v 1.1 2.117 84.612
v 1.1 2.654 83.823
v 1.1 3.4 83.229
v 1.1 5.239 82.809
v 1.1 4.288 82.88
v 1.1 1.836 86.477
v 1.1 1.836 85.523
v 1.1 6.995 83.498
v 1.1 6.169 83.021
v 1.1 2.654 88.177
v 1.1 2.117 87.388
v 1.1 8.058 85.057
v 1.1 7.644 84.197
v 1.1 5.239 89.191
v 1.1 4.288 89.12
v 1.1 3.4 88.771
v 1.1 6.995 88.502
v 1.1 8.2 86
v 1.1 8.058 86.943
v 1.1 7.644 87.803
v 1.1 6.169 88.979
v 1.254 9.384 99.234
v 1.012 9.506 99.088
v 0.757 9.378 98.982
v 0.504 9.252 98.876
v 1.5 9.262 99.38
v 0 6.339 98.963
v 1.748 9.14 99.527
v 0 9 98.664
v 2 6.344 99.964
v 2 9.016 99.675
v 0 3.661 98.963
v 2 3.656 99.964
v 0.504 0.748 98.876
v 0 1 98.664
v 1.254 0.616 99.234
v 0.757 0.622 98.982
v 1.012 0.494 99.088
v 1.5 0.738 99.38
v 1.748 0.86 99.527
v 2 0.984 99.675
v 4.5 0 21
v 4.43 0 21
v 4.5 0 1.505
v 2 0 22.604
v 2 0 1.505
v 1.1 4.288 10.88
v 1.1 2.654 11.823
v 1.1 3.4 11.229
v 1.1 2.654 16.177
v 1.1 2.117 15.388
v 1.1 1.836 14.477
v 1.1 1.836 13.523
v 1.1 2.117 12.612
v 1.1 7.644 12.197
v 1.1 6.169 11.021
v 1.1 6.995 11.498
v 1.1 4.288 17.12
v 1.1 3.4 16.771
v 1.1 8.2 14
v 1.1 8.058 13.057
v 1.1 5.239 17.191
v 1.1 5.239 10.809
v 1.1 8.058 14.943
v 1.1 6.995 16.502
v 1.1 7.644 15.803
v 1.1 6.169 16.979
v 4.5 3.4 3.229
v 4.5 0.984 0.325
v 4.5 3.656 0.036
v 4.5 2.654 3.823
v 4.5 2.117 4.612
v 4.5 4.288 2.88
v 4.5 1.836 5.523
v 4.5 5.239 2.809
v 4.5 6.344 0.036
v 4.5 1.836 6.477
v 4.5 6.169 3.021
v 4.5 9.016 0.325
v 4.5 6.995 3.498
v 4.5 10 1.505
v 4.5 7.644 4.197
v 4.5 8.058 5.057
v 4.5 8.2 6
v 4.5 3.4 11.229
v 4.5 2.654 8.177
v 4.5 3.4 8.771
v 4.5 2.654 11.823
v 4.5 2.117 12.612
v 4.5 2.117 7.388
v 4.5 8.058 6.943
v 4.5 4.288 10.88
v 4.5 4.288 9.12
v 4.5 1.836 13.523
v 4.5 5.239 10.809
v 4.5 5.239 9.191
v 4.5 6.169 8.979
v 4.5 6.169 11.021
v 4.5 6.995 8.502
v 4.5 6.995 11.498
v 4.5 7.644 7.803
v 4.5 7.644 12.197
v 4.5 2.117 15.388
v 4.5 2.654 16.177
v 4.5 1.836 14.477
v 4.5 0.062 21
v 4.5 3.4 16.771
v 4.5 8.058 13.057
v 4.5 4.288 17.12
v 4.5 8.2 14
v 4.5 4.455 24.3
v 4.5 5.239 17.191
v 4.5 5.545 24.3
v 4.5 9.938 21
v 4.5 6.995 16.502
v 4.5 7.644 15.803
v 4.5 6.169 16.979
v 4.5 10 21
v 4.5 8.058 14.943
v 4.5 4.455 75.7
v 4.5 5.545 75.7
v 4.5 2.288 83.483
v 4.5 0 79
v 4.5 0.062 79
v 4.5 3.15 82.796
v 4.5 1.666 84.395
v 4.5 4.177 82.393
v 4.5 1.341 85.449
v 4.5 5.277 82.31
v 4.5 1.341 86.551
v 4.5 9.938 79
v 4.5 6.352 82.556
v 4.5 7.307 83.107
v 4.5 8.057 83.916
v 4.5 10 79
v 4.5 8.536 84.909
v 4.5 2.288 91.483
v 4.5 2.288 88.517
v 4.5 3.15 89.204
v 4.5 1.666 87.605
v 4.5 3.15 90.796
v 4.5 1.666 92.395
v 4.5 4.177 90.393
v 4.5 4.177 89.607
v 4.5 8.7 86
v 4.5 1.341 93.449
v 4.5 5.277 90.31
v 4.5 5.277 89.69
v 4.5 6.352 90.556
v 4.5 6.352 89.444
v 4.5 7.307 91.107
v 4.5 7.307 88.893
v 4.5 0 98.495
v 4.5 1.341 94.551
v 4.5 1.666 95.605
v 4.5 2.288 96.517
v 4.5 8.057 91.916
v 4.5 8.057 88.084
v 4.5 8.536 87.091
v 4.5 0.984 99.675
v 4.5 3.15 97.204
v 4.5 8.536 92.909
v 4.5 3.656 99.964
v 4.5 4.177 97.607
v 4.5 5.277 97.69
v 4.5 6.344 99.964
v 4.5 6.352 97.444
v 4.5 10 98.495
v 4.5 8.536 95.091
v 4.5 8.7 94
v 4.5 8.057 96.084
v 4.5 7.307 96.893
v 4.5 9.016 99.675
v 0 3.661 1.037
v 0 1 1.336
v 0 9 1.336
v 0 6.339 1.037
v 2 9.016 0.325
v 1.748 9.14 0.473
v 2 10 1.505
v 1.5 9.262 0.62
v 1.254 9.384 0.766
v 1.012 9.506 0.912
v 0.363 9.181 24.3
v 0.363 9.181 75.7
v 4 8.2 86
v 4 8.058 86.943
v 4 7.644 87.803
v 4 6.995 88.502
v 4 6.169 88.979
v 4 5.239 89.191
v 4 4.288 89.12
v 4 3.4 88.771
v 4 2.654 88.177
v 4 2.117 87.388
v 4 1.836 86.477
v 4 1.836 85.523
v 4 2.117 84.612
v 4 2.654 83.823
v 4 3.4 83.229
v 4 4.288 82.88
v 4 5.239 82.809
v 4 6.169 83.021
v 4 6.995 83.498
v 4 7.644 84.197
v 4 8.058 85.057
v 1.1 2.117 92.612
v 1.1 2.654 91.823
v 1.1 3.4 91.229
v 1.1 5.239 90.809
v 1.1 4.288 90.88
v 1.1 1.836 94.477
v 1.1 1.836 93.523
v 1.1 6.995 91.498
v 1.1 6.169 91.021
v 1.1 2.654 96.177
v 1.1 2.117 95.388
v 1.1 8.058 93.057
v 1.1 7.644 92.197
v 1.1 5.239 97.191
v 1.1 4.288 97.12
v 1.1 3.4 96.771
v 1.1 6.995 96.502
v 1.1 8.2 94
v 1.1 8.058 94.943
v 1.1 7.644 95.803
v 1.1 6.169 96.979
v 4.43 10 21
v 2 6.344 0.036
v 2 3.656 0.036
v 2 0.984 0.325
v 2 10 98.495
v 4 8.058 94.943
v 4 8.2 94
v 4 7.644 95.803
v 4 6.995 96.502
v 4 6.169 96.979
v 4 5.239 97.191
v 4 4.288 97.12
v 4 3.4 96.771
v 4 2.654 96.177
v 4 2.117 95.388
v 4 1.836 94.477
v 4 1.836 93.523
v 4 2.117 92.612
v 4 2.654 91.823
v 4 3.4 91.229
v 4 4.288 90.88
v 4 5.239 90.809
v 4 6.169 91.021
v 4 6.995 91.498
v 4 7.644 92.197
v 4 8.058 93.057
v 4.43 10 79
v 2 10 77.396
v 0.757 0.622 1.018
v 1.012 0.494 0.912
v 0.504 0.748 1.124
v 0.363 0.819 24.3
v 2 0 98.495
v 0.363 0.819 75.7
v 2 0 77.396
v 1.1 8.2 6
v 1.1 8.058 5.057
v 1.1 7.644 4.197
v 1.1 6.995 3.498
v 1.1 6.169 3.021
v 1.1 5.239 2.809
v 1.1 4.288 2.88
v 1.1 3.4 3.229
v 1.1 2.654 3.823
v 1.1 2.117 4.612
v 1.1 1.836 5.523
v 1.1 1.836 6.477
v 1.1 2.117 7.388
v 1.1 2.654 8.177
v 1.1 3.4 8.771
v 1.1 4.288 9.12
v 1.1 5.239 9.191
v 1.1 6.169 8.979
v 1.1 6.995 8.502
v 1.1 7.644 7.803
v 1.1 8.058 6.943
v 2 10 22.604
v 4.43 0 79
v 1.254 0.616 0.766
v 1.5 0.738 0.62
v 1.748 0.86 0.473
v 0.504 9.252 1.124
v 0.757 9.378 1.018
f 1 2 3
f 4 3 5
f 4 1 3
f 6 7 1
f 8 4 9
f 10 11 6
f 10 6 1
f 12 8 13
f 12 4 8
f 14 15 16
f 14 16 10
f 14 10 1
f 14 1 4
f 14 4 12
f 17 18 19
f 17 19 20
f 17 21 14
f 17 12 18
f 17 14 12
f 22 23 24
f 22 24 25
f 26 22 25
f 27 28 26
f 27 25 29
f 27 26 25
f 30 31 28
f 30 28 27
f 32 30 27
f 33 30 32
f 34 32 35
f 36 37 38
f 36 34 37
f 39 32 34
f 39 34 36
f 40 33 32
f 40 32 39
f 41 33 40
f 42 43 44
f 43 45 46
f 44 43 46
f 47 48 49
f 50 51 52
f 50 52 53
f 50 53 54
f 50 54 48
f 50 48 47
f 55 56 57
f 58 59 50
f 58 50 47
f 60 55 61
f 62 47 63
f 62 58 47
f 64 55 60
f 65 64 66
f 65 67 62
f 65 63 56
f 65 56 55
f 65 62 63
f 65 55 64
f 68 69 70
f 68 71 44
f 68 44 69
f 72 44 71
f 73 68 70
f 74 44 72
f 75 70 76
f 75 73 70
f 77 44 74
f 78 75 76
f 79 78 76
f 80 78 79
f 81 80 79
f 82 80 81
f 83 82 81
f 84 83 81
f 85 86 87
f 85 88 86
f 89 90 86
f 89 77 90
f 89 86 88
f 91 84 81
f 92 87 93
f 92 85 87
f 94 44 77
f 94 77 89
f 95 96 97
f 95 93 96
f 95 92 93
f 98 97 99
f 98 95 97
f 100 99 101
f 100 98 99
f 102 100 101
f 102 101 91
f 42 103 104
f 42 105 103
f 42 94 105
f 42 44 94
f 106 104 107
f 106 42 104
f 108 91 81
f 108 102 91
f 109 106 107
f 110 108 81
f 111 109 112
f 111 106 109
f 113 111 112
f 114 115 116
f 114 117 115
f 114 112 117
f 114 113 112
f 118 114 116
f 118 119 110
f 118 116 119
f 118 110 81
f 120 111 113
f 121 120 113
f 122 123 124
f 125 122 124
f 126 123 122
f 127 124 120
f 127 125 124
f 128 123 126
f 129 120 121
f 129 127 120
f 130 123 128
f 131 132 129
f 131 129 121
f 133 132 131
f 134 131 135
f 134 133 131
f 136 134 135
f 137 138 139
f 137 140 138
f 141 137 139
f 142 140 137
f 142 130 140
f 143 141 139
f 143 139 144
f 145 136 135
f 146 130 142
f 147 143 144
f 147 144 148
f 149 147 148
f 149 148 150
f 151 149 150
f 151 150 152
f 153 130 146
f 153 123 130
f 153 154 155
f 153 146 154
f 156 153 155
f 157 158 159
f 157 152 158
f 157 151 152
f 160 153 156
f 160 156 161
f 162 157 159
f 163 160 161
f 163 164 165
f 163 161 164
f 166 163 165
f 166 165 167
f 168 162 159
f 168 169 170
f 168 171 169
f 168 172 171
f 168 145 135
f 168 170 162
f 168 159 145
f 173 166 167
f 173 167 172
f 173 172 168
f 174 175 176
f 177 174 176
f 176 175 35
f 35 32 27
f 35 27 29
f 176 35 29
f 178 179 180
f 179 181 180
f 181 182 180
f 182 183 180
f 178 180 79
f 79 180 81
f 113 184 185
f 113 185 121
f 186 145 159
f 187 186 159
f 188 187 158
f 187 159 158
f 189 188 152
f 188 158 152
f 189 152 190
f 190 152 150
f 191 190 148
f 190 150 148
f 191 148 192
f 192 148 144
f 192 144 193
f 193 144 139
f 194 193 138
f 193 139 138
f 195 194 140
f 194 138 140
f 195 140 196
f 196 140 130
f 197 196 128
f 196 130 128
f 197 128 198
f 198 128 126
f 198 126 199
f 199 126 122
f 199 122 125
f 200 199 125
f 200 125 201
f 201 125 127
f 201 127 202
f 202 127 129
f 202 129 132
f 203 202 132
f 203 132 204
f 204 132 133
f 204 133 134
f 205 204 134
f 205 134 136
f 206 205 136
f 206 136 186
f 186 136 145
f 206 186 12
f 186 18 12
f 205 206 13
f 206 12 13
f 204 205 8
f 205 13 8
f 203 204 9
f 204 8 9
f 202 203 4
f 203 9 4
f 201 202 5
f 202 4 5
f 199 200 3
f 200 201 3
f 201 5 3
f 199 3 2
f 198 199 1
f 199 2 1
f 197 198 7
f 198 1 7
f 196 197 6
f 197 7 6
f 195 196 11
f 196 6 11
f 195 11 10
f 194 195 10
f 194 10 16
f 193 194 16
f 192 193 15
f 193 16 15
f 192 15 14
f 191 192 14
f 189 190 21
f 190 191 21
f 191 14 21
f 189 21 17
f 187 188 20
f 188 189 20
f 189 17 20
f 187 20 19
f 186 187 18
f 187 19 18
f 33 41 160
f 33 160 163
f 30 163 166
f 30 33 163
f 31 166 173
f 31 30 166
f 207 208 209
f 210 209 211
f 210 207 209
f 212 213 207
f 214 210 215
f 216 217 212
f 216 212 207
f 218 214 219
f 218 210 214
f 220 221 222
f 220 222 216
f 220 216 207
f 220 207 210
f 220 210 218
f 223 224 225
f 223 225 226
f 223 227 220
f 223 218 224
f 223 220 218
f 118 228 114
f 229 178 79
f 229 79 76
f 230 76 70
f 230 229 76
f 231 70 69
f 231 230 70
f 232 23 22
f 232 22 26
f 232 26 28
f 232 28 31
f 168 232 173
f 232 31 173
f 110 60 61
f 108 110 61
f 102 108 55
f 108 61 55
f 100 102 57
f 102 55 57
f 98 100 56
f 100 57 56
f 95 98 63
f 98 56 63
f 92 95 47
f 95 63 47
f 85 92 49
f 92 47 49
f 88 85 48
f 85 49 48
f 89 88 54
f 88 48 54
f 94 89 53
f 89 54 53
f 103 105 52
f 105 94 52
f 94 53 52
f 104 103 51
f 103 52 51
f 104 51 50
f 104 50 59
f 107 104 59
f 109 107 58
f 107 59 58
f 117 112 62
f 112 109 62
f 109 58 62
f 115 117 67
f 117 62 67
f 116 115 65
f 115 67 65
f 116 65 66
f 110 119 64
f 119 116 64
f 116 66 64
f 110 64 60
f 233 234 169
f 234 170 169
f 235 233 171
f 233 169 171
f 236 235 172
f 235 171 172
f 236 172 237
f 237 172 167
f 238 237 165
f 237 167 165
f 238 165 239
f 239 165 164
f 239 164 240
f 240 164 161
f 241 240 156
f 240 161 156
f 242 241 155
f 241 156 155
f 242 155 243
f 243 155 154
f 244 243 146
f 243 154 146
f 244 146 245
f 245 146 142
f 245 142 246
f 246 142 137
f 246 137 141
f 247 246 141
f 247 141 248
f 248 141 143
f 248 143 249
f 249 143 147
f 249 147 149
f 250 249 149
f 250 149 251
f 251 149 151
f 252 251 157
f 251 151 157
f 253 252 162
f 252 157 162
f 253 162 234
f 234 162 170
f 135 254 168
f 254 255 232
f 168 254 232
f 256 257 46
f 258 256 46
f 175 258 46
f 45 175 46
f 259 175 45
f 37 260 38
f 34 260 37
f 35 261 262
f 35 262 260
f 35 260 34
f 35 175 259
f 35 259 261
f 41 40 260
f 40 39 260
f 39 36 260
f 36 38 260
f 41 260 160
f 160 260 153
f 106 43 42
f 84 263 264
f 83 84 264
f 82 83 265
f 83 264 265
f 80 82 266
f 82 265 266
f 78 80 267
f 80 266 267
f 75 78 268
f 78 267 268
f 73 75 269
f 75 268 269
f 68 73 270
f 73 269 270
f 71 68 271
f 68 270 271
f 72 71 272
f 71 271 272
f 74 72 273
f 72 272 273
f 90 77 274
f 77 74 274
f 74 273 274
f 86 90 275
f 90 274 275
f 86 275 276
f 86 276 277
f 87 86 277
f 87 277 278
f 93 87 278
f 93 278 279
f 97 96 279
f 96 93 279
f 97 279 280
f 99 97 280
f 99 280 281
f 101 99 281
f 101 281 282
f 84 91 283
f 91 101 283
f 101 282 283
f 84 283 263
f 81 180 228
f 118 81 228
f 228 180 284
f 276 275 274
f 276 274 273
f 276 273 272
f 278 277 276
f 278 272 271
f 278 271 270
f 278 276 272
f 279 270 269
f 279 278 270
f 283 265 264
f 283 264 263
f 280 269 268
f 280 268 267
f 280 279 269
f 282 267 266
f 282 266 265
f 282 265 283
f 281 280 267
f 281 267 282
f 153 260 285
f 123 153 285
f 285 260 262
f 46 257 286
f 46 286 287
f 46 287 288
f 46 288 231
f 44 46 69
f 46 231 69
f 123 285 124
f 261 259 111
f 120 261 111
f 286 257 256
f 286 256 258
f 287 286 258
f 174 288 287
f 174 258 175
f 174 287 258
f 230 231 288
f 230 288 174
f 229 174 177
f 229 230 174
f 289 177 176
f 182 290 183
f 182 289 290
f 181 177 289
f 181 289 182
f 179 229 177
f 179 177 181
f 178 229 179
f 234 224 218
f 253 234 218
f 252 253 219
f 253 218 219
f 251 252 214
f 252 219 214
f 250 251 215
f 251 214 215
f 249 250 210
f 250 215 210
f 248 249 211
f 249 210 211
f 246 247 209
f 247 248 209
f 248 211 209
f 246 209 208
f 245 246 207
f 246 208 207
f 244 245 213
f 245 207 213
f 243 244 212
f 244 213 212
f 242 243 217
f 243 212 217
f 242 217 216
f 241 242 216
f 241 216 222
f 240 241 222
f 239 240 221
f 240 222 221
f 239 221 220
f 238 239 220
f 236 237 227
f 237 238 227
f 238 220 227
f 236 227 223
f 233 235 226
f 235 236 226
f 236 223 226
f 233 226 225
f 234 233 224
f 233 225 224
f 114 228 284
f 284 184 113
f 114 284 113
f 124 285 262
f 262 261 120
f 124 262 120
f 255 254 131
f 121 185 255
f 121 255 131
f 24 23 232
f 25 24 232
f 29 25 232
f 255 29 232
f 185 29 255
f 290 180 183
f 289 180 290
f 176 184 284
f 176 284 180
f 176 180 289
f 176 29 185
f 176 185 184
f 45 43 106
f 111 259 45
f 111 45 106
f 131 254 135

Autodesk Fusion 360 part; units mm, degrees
sketch "Sketch1" plane through (0, 0, 0) normal (1, 0, 0) x (0, 1, 0)
  line L0 (0, 0) -> (10, 0)
  line L1 (10, 0) -> (10, 100)
  line L2 (10, 100) -> (0, 100)
  line L3 (0, 100) -> (0, 0)
  line L4 (5, 0) -> (5, 100) construction
  circle A0 centre (5, 94) radius 3.2
  line L5 (0, 90) -> (10, 90) construction
  circle A1 centre (5, 86) radius 3.2
  arc A2 (0, 0.5051) -> (10, 0.5051) centre (5, 25) ccw
  arc A3 (10, 99.4949) -> (0, 99.4949) centre (5, 75) ccw
  line L6 (0, 50) -> (10, 50) construction
  circle A4 centre (5, 6) radius 3.2
  circle A5 centre (5, 14) radius 3.2
  dimension "d1" = 10
  dimension "d2" = 100
  dimension "d3" = 6.4
  dimension "d4" = 8
  dimension "d11" = 25
  dimension "d20" = 40
extrude "Extrude1" add sketch "Sketch1" along normal blind 4.5 contours L1 L3 A2 A3
extrude "Extrude2" add sketch "Sketch1" along normal up to surface (1.1 mm away) contours A0 | A1 | A4 | A5
sketch "Sketch2" plane through (0, 0, 0) normal (0, 0, 1) x (1, 0, 0)
  line L0 (0, 9.5) -> (4.5, 5.5449)
  line L1 (0, 0) -> (0, 10)
  line L2 (0, 0) -> (0, 10)
  line L3 (0, 0) -> (4.5, 0)
  line L4 (4.5, 0) -> (0, 0)
  line L5 (4.5, 8.2) -> (4.5, 1.8)
  line L6 (4.5, 8.2) -> (4.5, 1.8)
  line L7 (4.5, 8.2) -> (4.5, 1.8)
  line L8 (4.5, 8.2) -> (4.5, 1.8)
  line L9 (4.5, 0) -> (4.5, 10)
  line L10 (4.5, 0) -> (4.5, 10)
  line L11 (0, 10) -> (4.5, 10)
  line L12 (4.5, 10) -> (0, 10)
  line L13 (4.5, 5) -> (0, 5) construction
  line L14 (0, 0.5) -> (4.5, 4.4551)
  dimension "d26" = 0.5
extrude "Extrude3" cut sketch "Sketch2" along normal mid plane 58 from surface at 50 contours L0 L1 L2 L5 L6 L7 L8 L9 L10 L11 L12 | L1 L2 L3 L4 L5 L6 L7 L8 L9 L10 L14
chamfer "Chamfer1" distance 0.5 angle 45 2 edges at (4.5, 2.0166, 95.1572) (4.5, 2.0166, 87.1572)
chamfer "Chamfer3" distance 1 distance2 1 4 edges at (2.25, 0, 99.4949) (2.25, 10, 99.4949) (2.25, 0, 0.5051) (2.25, 10, 0.5051) measured on face at (3, 7.7908, 99.8437) measured on face at (3, 10, 85.8316) measured on face at (3, 0, 14.1684) measured on face at (3, 4.4407, 0.0063)
chamfer "Chamfer2" distance 2 distance2 1 10 edges at (0, 0, 88.7474) (0, 0, 11.2526) (0, 10, 11.2526) (0, 10, 88.7474) (0, 5, 100) (0, 5, 0) (0, 0.4918, 99.0851) (0, 9.5082, 99.0851) (0, 9.5082, 0.9149) (0, 0.4918, 0.9149) measured on face at (1.5, 0, 91.9966) measured on face at (3, 0, 14.5017) measured on face at (3, 10, 8.0034) measured on face at (3, 10, 85.4983) measured on face at (3, 8.1292, 99.8034) measured on face at (3, 4.5518, 0.004) measured on face at (3, 0.6557, 99.2818) measured on face at (3, 9.6721, 98.8884) measured on face at (1.5, 9.6721, 1.1116) measured on face at (1.5, 0.6557, 0.7182)
chamfer "Chamfer4" distance 3.3 angle 45 4 edges at (2.4313, 7.3631, 21) (2.4313, 7.3631, 79) (2.4313, 2.6369, 21) (2.4313, 2.6369, 79)
